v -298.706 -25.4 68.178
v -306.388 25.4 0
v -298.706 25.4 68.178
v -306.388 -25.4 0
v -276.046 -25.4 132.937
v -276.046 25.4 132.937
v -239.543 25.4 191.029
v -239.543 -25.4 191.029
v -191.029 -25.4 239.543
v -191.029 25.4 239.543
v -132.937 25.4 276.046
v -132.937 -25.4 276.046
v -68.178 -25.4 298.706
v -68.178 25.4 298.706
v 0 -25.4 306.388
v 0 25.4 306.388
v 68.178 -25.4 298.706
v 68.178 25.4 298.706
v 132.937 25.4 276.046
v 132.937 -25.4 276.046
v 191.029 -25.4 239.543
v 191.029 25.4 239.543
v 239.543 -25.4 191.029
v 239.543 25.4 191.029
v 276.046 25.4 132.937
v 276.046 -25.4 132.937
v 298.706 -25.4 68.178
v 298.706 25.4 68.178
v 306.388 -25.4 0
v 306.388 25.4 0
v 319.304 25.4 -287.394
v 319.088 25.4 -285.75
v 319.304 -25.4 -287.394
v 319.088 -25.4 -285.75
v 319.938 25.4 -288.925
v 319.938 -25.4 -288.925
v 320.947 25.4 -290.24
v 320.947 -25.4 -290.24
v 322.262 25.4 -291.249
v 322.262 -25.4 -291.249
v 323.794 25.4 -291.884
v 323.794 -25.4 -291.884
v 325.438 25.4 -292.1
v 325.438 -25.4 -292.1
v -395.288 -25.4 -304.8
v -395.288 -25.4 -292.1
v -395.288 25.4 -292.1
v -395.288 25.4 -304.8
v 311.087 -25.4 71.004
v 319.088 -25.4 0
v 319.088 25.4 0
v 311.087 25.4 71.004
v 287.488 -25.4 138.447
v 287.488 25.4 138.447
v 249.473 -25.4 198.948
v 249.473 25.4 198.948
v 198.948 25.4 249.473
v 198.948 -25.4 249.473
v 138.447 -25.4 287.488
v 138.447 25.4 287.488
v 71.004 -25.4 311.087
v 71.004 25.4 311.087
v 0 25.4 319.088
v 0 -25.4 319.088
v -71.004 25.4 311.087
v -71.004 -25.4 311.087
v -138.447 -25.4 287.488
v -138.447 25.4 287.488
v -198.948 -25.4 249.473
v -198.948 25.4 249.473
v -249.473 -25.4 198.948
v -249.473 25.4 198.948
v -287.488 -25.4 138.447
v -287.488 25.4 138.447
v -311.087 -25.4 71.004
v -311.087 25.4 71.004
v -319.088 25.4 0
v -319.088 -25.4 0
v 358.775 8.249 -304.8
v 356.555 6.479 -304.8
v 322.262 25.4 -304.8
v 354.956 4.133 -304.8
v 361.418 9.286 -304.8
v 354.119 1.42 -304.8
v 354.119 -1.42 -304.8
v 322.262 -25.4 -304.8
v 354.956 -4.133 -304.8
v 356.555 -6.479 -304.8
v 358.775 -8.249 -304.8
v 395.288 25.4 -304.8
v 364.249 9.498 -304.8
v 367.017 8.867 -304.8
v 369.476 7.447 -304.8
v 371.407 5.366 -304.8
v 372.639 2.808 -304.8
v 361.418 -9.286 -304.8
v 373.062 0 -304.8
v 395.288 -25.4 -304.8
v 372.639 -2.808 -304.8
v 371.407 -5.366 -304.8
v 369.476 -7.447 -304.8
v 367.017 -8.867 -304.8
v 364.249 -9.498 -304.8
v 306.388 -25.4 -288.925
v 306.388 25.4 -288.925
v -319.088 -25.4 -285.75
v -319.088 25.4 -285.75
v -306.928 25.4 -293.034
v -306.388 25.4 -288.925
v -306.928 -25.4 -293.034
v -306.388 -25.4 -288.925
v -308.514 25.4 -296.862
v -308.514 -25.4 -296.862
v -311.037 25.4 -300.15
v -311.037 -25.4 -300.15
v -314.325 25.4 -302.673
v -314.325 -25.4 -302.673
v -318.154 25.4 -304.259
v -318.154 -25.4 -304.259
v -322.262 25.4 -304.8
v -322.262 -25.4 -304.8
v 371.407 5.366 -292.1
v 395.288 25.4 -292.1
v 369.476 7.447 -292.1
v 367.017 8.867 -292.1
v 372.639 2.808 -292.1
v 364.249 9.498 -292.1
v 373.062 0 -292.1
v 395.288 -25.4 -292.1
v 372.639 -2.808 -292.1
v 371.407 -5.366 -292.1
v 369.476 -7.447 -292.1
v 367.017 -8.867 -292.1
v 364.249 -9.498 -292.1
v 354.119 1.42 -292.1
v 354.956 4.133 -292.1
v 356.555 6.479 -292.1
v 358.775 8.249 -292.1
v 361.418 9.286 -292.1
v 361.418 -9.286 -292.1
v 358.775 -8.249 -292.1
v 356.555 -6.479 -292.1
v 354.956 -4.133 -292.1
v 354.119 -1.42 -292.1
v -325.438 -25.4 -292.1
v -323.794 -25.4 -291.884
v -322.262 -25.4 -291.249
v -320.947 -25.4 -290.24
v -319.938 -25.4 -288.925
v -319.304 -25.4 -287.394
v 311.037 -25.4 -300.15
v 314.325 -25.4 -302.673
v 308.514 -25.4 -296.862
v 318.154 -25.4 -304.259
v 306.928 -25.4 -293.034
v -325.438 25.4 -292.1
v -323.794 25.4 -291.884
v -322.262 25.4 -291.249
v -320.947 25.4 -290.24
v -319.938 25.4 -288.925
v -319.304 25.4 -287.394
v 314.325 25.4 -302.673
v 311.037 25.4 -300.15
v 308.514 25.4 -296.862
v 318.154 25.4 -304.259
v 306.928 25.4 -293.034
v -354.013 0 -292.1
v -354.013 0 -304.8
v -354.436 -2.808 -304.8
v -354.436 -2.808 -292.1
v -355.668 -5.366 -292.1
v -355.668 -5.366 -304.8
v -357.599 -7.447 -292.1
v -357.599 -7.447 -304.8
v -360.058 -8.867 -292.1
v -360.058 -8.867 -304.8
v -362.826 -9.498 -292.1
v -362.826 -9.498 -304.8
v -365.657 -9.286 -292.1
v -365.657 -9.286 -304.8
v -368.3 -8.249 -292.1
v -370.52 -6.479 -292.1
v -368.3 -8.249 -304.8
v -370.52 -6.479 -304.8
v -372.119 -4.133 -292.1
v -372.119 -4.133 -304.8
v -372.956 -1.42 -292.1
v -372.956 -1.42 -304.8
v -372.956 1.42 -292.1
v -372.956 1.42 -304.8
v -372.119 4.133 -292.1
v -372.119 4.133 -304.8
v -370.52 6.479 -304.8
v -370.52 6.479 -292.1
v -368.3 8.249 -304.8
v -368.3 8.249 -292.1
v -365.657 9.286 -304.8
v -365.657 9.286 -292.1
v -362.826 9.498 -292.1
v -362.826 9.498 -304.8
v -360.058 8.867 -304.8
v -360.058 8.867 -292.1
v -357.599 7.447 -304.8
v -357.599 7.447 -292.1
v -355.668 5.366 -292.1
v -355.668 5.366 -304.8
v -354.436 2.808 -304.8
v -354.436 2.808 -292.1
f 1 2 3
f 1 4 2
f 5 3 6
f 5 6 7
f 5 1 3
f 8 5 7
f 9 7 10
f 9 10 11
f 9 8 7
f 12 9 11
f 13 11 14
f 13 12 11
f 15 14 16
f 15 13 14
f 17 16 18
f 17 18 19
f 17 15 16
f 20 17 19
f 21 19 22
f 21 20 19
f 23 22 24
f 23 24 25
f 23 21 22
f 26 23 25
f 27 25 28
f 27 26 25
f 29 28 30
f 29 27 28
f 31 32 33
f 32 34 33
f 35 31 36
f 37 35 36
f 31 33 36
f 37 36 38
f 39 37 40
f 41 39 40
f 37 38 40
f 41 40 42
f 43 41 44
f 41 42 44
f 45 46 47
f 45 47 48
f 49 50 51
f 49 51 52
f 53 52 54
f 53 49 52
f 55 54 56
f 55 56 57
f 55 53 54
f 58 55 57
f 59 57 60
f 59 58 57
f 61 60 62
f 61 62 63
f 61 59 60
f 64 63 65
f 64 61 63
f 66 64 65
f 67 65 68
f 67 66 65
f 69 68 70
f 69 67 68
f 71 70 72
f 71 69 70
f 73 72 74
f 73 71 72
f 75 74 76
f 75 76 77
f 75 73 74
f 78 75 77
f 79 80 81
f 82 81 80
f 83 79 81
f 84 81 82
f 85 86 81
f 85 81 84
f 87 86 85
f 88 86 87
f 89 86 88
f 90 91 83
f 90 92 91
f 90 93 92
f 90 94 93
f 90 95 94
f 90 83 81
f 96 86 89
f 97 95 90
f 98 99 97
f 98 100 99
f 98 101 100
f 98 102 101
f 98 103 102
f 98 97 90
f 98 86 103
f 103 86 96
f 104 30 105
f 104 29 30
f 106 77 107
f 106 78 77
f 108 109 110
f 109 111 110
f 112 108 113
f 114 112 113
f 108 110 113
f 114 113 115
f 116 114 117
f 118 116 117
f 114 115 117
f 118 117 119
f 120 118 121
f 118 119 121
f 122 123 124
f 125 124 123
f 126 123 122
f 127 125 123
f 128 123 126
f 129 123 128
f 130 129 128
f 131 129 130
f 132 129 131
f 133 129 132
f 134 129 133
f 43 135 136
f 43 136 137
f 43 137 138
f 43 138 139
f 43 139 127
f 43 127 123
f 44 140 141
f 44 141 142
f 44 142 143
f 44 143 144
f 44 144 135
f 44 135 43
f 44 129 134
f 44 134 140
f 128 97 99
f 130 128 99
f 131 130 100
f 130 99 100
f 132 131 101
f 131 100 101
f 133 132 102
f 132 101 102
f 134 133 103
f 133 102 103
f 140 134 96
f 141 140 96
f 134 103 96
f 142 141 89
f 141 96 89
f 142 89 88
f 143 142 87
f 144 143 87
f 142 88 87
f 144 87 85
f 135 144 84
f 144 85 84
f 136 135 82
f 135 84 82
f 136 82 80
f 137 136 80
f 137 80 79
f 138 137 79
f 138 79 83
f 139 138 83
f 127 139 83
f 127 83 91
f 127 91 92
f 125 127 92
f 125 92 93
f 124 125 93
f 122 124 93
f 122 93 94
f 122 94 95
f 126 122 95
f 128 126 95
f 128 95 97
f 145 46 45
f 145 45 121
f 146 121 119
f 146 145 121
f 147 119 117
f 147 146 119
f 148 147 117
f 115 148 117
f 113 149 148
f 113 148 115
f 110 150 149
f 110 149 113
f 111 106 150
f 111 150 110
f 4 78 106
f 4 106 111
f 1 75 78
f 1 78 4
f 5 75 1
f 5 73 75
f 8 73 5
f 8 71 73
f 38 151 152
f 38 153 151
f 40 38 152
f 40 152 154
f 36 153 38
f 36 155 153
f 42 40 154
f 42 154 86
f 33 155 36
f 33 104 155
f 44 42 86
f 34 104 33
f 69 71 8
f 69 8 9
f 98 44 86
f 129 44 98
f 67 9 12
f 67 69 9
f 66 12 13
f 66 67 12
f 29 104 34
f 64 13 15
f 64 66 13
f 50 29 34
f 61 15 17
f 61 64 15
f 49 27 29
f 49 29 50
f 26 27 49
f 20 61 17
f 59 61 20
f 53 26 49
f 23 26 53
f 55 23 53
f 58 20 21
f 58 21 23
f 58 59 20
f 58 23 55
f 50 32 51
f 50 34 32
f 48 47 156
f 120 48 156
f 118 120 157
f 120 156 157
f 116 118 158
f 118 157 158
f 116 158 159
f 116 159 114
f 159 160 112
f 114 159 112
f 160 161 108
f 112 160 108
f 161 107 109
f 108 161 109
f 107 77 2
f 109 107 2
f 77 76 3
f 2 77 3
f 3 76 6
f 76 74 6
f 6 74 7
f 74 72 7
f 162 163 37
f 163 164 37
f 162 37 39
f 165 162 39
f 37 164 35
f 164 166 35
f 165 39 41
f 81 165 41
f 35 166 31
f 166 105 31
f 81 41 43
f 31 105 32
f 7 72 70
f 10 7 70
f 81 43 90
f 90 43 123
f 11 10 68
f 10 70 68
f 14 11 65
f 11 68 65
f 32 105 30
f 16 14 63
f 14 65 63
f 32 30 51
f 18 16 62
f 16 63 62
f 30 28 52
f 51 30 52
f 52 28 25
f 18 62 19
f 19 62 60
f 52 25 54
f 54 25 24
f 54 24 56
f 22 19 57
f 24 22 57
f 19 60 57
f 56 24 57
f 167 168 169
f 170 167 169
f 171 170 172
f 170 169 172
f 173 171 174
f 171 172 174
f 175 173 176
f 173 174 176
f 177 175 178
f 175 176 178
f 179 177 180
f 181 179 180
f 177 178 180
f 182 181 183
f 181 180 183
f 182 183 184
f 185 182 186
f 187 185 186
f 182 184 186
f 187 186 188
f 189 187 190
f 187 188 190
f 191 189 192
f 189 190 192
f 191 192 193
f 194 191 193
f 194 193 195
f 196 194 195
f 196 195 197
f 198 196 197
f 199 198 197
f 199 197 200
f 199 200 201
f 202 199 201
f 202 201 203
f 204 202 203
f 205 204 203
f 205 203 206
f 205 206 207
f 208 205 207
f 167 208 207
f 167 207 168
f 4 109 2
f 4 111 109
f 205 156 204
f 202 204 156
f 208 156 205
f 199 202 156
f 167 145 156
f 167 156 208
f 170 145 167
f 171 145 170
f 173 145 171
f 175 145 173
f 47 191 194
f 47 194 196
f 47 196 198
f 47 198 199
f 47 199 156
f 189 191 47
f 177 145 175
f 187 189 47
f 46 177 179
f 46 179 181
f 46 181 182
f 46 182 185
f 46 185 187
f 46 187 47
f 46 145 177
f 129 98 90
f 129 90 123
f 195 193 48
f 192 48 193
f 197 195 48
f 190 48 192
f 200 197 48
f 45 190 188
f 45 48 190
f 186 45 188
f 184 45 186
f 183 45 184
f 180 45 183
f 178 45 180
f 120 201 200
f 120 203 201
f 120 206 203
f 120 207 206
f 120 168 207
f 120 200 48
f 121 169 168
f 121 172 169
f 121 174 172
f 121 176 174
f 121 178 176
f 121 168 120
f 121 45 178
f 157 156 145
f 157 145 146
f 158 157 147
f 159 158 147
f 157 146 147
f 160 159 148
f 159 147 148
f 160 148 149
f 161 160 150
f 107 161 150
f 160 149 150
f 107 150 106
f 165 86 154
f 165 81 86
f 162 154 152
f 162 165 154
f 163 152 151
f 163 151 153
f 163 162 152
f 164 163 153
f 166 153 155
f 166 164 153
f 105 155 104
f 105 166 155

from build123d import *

# Parameters (mm, degrees)
F1_DEPTH = 25.4
F2_R     = 6.35
F3_R     = 15.875
F4_R     = 9.525
F5_DEPTH = 25.4


with BuildPart() as f1:
    # F0 (on Front) → F1 (new body, symmetric)
    with BuildSketch(Plane.XZ):
        with BuildLine():
            Line((306.3875, -304.8), (395.2875, -304.8))
            Line((395.2875, -304.8), (395.2875, -292.1))
            Line((395.2875, -292.1), (319.0875, -292.1))
            Line((319.0875, -292.1), (319.0875, 0))
            ThreePointArc((319.0875, 0), (0, 319.0875), (-319.0875, 0))
            Line((-319.0875, 0), (-319.0875, -292.1))
            Line((-319.0875, -292.1), (-395.2875, -292.1))
            Line((-395.2875, -292.1), (-395.2875, -304.8))
            Line((-395.2875, -304.8), (-306.3875, -304.8))
            Line((-306.3875, -304.8), (-306.3875, 0))
            ThreePointArc((-306.3875, 0), (0, 306.3875), (306.3875, 0))
            Line((306.3875, 0), (306.3875, -304.8))
        make_face()
    extrude(amount=F1_DEPTH, both=True)

    # F2
    f2_edges = [f1.edges().sort_by_distance(p)[0] for p in [
        (-319.0875, 0, -292.1),
        (319.0875, 0, -292.1),
    ]]
    fillet(f2_edges, radius=F2_R)

    # F3
    f3_edges = [f1.edges().sort_by_distance(p)[0] for p in [
        (306.3875, 0, -304.8),
        (-306.3875, 0, -304.8),
    ]]
    fillet(f3_edges, radius=F3_R)

    # F4 (on face) → F5 (cut)
    with BuildSketch(Plane(origin=(0, 0, -304.8), x_dir=(1, 0, 0), z_dir=(0, 0, -1))):
        with Locations((-363.5375, 0)):
            Circle(F4_R)
        with Locations((363.5375, 0)):
            Circle(F4_R)
    extrude(amount=-F5_DEPTH, mode=Mode.SUBTRACT)


solid = f1.part
